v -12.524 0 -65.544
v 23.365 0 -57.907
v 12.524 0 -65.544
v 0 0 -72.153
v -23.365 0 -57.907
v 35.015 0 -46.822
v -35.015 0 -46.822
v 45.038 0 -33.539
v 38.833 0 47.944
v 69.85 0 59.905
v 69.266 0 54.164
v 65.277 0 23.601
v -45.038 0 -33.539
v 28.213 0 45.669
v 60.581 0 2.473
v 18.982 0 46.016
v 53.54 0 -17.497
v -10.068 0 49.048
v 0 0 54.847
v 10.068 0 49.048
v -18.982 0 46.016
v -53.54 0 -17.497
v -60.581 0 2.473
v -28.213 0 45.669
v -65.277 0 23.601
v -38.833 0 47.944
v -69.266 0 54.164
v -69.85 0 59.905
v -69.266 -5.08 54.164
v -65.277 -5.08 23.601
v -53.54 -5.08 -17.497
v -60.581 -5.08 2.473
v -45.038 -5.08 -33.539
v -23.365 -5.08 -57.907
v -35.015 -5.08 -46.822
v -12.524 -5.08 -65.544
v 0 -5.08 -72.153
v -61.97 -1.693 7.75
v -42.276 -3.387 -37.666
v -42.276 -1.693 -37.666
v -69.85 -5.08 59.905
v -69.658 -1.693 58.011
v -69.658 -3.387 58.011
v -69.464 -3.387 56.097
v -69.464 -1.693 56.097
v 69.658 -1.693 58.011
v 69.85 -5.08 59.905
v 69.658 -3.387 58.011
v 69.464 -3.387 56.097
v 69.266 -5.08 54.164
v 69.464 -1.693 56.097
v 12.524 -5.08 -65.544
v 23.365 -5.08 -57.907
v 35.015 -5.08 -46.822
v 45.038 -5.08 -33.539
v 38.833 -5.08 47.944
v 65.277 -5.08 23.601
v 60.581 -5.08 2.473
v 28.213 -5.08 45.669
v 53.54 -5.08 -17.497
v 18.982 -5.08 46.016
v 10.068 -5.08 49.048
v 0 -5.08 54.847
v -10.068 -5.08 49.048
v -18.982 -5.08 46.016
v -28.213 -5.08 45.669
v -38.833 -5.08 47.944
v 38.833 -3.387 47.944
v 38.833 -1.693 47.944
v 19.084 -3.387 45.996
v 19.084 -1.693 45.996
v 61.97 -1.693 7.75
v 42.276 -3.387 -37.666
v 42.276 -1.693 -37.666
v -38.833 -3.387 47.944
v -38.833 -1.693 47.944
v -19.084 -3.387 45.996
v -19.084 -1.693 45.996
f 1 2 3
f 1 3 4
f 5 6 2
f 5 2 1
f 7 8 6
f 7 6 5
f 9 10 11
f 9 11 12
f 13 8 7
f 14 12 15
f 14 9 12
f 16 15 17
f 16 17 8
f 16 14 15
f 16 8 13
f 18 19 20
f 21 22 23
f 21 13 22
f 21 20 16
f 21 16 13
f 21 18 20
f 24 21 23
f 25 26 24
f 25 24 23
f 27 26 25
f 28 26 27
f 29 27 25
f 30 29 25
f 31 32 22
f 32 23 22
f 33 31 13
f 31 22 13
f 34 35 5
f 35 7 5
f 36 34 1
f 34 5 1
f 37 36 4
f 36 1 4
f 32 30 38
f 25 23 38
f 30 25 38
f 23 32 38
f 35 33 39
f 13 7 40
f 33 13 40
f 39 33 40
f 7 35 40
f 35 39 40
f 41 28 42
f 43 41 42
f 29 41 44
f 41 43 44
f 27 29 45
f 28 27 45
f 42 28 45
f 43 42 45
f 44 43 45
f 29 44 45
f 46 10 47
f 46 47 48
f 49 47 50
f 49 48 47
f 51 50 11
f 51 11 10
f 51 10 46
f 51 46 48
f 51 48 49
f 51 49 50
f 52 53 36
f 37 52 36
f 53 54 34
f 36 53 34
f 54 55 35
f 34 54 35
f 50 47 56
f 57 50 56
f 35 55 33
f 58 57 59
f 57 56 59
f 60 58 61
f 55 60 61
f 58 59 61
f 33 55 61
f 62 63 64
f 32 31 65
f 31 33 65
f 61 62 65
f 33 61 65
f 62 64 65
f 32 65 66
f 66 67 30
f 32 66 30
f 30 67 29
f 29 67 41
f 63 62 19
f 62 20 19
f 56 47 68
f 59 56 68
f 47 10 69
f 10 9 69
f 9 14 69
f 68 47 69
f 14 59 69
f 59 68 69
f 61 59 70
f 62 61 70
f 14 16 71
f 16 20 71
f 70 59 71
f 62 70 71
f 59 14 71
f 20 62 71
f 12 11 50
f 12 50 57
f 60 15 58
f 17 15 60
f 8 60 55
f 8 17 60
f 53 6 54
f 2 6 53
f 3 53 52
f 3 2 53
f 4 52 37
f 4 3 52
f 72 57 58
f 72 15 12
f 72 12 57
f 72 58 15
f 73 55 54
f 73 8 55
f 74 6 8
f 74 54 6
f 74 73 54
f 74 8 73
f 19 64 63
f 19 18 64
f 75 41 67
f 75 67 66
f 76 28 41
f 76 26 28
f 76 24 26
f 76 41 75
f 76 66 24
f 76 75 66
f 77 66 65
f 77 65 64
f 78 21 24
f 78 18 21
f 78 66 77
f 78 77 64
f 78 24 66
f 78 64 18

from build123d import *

# Parameters (mm, degrees)
F1_DEPTH = 5.08


# Not quite as in the source:
# - ends of sketch curves that miss each other by under 0.0002 mm in the source are joined


with BuildPart() as f1:
    # F0 (on Front) → F1 (new body)
    with BuildSketch(Plane.XZ):
        with BuildLine():
            add(Edge.make_bspline(
                [(69.85, 59.9050451917), (69.6591630317, 58.0205304518), (69.4657837415, 56.105507858), (69.2658161809, 54.1639224361)],
                knots=[0, 0, 0, 0, 6.3686924223, 6.3686924223, 6.3686924223, 6.3686924223], degree=3))
            add(Edge.make_bspline(
                [(69.85, 59.9050451917), (29.6646114439, 43.1978777051), (22.2865504252, 40.336203924), (0, 54.8465235897)],
                knots=[0, 0, 0, 0, 70.0329289749, 70.0329289749, 70.0329289749, 70.0329289749], degree=3))
            add(Edge.make_bspline(
                [(-69.85, 59.9050451917), (-29.6646114439, 43.1978777051), (-22.2865504252, 40.336203924), (0, 54.8465235897)],
                knots=[0, 0, 0, 0, 70.0329289749, 70.0329289749, 70.0329289749, 70.0329289749], degree=3))
            add(Edge.make_bspline(
                [(-69.85, 59.9050451917), (-69.6591630317, 58.0205304518), (-69.4657837415, 56.105507858), (-69.2658161809, 54.1639224361)],
                knots=[0, 0, 0, 0, 6.3686924223, 6.3686924223, 6.3686924223, 6.3686924223], degree=3))
            add(Edge.make_bspline(
                [(-69.2658161783, 54.1639224373), (-68.435377118, 53.8183422364), (-66.6556116111, 53.0753974425), (-64.8761610511, 52.3317704272), (-63.9263795957, 51.9355805251)],
                knots=[2.7434490873, 2.7434490873, 2.7434490873, 2.7434490873, 5.4418546999, 8.5291588217, 8.5291588217, 8.5291588217, 8.5291588217], degree=3))
            add(Edge.make_bspline(
                [(-63.9263795957, 51.9355805251), (-61.8621309574, 51.0745040519), (-56.1021142689, 48.6812764055), (-47.7406374178, 45.3549636264), (-39.4375160633, 42.5935516843), (-33.4464354817, 41.219419811), (-28.7724481834, 40.4865030944), (-24.7049900131, 40.2576737616), (-20.7256507732, 40.4650803867), (-16.8202071601, 41.130682749), (-12.9707995749, 42.2328724248), (-8.7178720085, 43.9515281326), (-4.3615220824, 46.044445106), (-1.3844475727, 47.8958436146), (-0.0332400038, 48.7623797008), (0, 48.7837122639)],
                knots=[8.5291588217, 8.5291588217, 8.5291588217, 8.5291588217, 15.2390848713, 27.2415659858, 35.5219361762, 41.4579165876, 45.6606303606, 49.7014880209, 53.6563538897, 57.5892253523, 61.5614465465, 65.6429176226, 71.3392641934, 76.0338793574, 76.152307097, 76.152307097, 76.152307097, 76.152307097], degree=3))
            add(Edge.make_bspline(
                [(63.9263795957, 51.9355805251), (61.8621309574, 51.0745040519), (56.1021142689, 48.6812764055), (47.7406374178, 45.3549636264), (39.4375160633, 42.5935516843), (33.4464354817, 41.219419811), (28.7724481834, 40.4865030944), (24.7049900131, 40.2576737616), (20.7256507732, 40.4650803867), (16.8202071601, 41.130682749), (12.9707995749, 42.2328724248), (8.7178720085, 43.9515281326), (4.3615220824, 46.044445106), (1.3844475727, 47.8958436146), (0.0332400038, 48.7623797008), (0, 48.7837122639)],
                knots=[8.5291588217, 8.5291588217, 8.5291588217, 8.5291588217, 15.2390848713, 27.2415659858, 35.5219361762, 41.4579165876, 45.6606303606, 49.7014880209, 53.6563538897, 57.5892253523, 61.5614465465, 65.6429176226, 71.3392641934, 76.0338793574, 76.152307097, 76.152307097, 76.152307097, 76.152307097], degree=3))
            add(Edge.make_bspline(
                [(69.2658161783, 54.1639224373), (68.435377118, 53.8183422364), (66.6556116111, 53.0753974425), (64.8761610511, 52.3317704272), (63.9263795957, 51.9355805251)],
                knots=[2.7434490873, 2.7434490873, 2.7434490873, 2.7434490873, 5.4418546999, 8.5291588217, 8.5291588217, 8.5291588217, 8.5291588217], degree=3))
        make_face()
        with BuildLine():
            add(Edge.make_bspline(
                [(69.2658161809, 54.1639224361), (64.7750418343, 10.5607401093), (56.961539529, -46.4391375943), (0, -72.1534764103)],
                knots=[6.3686924223, 6.3686924223, 6.3686924223, 6.3686924223, 149.3936934001, 149.3936934001, 149.3936934001, 149.3936934001], degree=3))
            add(Edge.make_bspline(
                [(69.2658161809, 54.1639224361), (68.435377118, 53.8183422364), (66.6556116111, 53.0753974425), (64.8761610511, 52.3317704272), (63.9263795957, 51.9355805251)],
                knots=[2.7434490873, 2.7434490873, 2.7434490873, 2.7434490873, 5.4418546999, 8.5291588217, 8.5291588217, 8.5291588217, 8.5291588217], degree=3))
            add(Edge.make_bspline(
                [(63.9263795957, 51.9355805251), (63.6253355549, 49.0777517049), (62.6683683388, 40.3495230581), (60.6243910667, 25.2903357755), (56.8644266428, 6.9882226507), (51.2318594545, -10.9343345603), (43.1811515415, -27.8959051236), (32.1695249216, -43.368046578), (18.0779778329, -56.4464882841), (6.2692486092, -63.5700966147), (1.35086e-05, -66.5543592491)],
                knots=[0.0627067414, 0.0627067414, 0.0627067414, 0.0627067414, 0.125, 0.25, 0.375, 0.5, 0.625, 0.75, 0.875, 0.9876294304, 0.9876294304, 0.9876294304, 0.9876294304], degree=3))
            add(Edge.make_bspline(
                [(-63.9263795983, 51.9355805238), (-63.6253355549, 49.0777517049), (-62.6683683388, 40.3495230581), (-60.6243910667, 25.2903357755), (-56.8644266428, 6.9882226507), (-51.2318594545, -10.9343345603), (-43.1811515415, -27.8959051236), (-32.1695249216, -43.368046578), (-18.0779778329, -56.4464882841), (-6.2692486092, -63.5700966147), (1.35086e-05, -66.5543592491)],
                knots=[0.0627067414, 0.0627067414, 0.0627067414, 0.0627067414, 0.125, 0.25, 0.375, 0.5, 0.625, 0.75, 0.875, 0.9876294304, 0.9876294304, 0.9876294304, 0.9876294304], degree=3))
            add(Edge.make_bspline(
                [(-69.2658161783, 54.1639224373), (-68.435377118, 53.8183422364), (-66.6556116111, 53.0753974425), (-64.8761610511, 52.3317704272), (-63.9263795983, 51.9355805238)],
                knots=[2.7434490873, 2.7434490873, 2.7434490873, 2.7434490873, 5.4418546999, 8.5291588217, 8.5291588217, 8.5291588217, 8.5291588217], degree=3))
            add(Edge.make_bspline(
                [(-69.2658161783, 54.1639224373), (-64.7750418343, 10.5607401093), (-56.961539529, -46.4391375943), (0, -72.1534764103)],
                knots=[6.3686924223, 6.3686924223, 6.3686924223, 6.3686924223, 149.3936934001, 149.3936934001, 149.3936934001, 149.3936934001], degree=3))
        make_face()
        with BuildLine():
            add(Edge.make_bspline(
                [(63.9263795983, 51.9355805238), (63.6253355549, 49.0777517049), (62.6683683388, 40.3495230581), (60.6243910667, 25.2903357755), (56.8644266428, 6.9882226507), (51.2318594545, -10.9343345603), (43.1811515415, -27.8959051236), (32.1695249216, -43.368046578), (18.0779778329, -56.4464882841), (6.2692486092, -63.5700966147), (1.35086e-05, -66.5543592491)],
                knots=[0.0627067414, 0.0627067414, 0.0627067414, 0.0627067414, 0.125, 0.25, 0.375, 0.5, 0.625, 0.75, 0.875, 0.9876294304, 0.9876294304, 0.9876294304, 0.9876294304], degree=3))
            add(Edge.make_bspline(
                [(63.9263795983, 51.9355805238), (61.8621309574, 51.0745040519), (56.1021142689, 48.6812764055), (47.7406374178, 45.3549636264), (39.4375160633, 42.5935516843), (33.4464354817, 41.219419811), (28.7724481834, 40.4865030944), (24.7049900131, 40.2576737616), (20.7256507732, 40.4650803867), (16.8202071601, 41.130682749), (12.9707995749, 42.2328724248), (8.7178720085, 43.9515281326), (4.3615220824, 46.044445106), (1.3844475727, 47.8958436146), (0.0332400038, 48.7623797008), (0, 48.7837122639)],
                knots=[8.5291588217, 8.5291588217, 8.5291588217, 8.5291588217, 15.2390848713, 27.2415659858, 35.5219361762, 41.4579165876, 45.6606303606, 49.7014880209, 53.6563538897, 57.5892253523, 61.5614465465, 65.6429176226, 71.3392641934, 76.0338793574, 76.152307097, 76.152307097, 76.152307097, 76.152307097], degree=3))
            add(Edge.make_bspline(
                [(-63.9263795957, 51.9355805251), (-61.8621309574, 51.0745040519), (-56.1021142689, 48.6812764055), (-47.7406374178, 45.3549636264), (-39.4375160633, 42.5935516843), (-33.4464354817, 41.219419811), (-28.7724481834, 40.4865030944), (-24.7049900131, 40.2576737616), (-20.7256507732, 40.4650803867), (-16.8202071601, 41.130682749), (-12.9707995749, 42.2328724248), (-8.7178720085, 43.9515281326), (-4.3615220824, 46.044445106), (-1.3844475727, 47.8958436146), (-0.0332400038, 48.7623797008), (0, 48.7837122639)],
                knots=[8.5291588217, 8.5291588217, 8.5291588217, 8.5291588217, 15.2390848713, 27.2415659858, 35.5219361762, 41.4579165876, 45.6606303606, 49.7014880209, 53.6563538897, 57.5892253523, 61.5614465465, 65.6429176226, 71.3392641934, 76.0338793574, 76.152307097, 76.152307097, 76.152307097, 76.152307097], degree=3))
            add(Edge.make_bspline(
                [(-63.9263795957, 51.9355805251), (-63.6253355549, 49.0777517049), (-62.6683683388, 40.3495230581), (-60.6243910667, 25.2903357755), (-56.8644266428, 6.9882226507), (-51.2318594545, -10.9343345603), (-43.1811515415, -27.8959051236), (-32.1695249216, -43.368046578), (-18.0779778329, -56.4464882841), (-6.2692486092, -63.5700966147), (1.35086e-05, -66.5543592491)],
                knots=[0.0627067414, 0.0627067414, 0.0627067414, 0.0627067414, 0.125, 0.25, 0.375, 0.5, 0.625, 0.75, 0.875, 0.9876294304, 0.9876294304, 0.9876294304, 0.9876294304], degree=3))
        make_face()
    extrude(amount=F1_DEPTH)


solid = f1.part
